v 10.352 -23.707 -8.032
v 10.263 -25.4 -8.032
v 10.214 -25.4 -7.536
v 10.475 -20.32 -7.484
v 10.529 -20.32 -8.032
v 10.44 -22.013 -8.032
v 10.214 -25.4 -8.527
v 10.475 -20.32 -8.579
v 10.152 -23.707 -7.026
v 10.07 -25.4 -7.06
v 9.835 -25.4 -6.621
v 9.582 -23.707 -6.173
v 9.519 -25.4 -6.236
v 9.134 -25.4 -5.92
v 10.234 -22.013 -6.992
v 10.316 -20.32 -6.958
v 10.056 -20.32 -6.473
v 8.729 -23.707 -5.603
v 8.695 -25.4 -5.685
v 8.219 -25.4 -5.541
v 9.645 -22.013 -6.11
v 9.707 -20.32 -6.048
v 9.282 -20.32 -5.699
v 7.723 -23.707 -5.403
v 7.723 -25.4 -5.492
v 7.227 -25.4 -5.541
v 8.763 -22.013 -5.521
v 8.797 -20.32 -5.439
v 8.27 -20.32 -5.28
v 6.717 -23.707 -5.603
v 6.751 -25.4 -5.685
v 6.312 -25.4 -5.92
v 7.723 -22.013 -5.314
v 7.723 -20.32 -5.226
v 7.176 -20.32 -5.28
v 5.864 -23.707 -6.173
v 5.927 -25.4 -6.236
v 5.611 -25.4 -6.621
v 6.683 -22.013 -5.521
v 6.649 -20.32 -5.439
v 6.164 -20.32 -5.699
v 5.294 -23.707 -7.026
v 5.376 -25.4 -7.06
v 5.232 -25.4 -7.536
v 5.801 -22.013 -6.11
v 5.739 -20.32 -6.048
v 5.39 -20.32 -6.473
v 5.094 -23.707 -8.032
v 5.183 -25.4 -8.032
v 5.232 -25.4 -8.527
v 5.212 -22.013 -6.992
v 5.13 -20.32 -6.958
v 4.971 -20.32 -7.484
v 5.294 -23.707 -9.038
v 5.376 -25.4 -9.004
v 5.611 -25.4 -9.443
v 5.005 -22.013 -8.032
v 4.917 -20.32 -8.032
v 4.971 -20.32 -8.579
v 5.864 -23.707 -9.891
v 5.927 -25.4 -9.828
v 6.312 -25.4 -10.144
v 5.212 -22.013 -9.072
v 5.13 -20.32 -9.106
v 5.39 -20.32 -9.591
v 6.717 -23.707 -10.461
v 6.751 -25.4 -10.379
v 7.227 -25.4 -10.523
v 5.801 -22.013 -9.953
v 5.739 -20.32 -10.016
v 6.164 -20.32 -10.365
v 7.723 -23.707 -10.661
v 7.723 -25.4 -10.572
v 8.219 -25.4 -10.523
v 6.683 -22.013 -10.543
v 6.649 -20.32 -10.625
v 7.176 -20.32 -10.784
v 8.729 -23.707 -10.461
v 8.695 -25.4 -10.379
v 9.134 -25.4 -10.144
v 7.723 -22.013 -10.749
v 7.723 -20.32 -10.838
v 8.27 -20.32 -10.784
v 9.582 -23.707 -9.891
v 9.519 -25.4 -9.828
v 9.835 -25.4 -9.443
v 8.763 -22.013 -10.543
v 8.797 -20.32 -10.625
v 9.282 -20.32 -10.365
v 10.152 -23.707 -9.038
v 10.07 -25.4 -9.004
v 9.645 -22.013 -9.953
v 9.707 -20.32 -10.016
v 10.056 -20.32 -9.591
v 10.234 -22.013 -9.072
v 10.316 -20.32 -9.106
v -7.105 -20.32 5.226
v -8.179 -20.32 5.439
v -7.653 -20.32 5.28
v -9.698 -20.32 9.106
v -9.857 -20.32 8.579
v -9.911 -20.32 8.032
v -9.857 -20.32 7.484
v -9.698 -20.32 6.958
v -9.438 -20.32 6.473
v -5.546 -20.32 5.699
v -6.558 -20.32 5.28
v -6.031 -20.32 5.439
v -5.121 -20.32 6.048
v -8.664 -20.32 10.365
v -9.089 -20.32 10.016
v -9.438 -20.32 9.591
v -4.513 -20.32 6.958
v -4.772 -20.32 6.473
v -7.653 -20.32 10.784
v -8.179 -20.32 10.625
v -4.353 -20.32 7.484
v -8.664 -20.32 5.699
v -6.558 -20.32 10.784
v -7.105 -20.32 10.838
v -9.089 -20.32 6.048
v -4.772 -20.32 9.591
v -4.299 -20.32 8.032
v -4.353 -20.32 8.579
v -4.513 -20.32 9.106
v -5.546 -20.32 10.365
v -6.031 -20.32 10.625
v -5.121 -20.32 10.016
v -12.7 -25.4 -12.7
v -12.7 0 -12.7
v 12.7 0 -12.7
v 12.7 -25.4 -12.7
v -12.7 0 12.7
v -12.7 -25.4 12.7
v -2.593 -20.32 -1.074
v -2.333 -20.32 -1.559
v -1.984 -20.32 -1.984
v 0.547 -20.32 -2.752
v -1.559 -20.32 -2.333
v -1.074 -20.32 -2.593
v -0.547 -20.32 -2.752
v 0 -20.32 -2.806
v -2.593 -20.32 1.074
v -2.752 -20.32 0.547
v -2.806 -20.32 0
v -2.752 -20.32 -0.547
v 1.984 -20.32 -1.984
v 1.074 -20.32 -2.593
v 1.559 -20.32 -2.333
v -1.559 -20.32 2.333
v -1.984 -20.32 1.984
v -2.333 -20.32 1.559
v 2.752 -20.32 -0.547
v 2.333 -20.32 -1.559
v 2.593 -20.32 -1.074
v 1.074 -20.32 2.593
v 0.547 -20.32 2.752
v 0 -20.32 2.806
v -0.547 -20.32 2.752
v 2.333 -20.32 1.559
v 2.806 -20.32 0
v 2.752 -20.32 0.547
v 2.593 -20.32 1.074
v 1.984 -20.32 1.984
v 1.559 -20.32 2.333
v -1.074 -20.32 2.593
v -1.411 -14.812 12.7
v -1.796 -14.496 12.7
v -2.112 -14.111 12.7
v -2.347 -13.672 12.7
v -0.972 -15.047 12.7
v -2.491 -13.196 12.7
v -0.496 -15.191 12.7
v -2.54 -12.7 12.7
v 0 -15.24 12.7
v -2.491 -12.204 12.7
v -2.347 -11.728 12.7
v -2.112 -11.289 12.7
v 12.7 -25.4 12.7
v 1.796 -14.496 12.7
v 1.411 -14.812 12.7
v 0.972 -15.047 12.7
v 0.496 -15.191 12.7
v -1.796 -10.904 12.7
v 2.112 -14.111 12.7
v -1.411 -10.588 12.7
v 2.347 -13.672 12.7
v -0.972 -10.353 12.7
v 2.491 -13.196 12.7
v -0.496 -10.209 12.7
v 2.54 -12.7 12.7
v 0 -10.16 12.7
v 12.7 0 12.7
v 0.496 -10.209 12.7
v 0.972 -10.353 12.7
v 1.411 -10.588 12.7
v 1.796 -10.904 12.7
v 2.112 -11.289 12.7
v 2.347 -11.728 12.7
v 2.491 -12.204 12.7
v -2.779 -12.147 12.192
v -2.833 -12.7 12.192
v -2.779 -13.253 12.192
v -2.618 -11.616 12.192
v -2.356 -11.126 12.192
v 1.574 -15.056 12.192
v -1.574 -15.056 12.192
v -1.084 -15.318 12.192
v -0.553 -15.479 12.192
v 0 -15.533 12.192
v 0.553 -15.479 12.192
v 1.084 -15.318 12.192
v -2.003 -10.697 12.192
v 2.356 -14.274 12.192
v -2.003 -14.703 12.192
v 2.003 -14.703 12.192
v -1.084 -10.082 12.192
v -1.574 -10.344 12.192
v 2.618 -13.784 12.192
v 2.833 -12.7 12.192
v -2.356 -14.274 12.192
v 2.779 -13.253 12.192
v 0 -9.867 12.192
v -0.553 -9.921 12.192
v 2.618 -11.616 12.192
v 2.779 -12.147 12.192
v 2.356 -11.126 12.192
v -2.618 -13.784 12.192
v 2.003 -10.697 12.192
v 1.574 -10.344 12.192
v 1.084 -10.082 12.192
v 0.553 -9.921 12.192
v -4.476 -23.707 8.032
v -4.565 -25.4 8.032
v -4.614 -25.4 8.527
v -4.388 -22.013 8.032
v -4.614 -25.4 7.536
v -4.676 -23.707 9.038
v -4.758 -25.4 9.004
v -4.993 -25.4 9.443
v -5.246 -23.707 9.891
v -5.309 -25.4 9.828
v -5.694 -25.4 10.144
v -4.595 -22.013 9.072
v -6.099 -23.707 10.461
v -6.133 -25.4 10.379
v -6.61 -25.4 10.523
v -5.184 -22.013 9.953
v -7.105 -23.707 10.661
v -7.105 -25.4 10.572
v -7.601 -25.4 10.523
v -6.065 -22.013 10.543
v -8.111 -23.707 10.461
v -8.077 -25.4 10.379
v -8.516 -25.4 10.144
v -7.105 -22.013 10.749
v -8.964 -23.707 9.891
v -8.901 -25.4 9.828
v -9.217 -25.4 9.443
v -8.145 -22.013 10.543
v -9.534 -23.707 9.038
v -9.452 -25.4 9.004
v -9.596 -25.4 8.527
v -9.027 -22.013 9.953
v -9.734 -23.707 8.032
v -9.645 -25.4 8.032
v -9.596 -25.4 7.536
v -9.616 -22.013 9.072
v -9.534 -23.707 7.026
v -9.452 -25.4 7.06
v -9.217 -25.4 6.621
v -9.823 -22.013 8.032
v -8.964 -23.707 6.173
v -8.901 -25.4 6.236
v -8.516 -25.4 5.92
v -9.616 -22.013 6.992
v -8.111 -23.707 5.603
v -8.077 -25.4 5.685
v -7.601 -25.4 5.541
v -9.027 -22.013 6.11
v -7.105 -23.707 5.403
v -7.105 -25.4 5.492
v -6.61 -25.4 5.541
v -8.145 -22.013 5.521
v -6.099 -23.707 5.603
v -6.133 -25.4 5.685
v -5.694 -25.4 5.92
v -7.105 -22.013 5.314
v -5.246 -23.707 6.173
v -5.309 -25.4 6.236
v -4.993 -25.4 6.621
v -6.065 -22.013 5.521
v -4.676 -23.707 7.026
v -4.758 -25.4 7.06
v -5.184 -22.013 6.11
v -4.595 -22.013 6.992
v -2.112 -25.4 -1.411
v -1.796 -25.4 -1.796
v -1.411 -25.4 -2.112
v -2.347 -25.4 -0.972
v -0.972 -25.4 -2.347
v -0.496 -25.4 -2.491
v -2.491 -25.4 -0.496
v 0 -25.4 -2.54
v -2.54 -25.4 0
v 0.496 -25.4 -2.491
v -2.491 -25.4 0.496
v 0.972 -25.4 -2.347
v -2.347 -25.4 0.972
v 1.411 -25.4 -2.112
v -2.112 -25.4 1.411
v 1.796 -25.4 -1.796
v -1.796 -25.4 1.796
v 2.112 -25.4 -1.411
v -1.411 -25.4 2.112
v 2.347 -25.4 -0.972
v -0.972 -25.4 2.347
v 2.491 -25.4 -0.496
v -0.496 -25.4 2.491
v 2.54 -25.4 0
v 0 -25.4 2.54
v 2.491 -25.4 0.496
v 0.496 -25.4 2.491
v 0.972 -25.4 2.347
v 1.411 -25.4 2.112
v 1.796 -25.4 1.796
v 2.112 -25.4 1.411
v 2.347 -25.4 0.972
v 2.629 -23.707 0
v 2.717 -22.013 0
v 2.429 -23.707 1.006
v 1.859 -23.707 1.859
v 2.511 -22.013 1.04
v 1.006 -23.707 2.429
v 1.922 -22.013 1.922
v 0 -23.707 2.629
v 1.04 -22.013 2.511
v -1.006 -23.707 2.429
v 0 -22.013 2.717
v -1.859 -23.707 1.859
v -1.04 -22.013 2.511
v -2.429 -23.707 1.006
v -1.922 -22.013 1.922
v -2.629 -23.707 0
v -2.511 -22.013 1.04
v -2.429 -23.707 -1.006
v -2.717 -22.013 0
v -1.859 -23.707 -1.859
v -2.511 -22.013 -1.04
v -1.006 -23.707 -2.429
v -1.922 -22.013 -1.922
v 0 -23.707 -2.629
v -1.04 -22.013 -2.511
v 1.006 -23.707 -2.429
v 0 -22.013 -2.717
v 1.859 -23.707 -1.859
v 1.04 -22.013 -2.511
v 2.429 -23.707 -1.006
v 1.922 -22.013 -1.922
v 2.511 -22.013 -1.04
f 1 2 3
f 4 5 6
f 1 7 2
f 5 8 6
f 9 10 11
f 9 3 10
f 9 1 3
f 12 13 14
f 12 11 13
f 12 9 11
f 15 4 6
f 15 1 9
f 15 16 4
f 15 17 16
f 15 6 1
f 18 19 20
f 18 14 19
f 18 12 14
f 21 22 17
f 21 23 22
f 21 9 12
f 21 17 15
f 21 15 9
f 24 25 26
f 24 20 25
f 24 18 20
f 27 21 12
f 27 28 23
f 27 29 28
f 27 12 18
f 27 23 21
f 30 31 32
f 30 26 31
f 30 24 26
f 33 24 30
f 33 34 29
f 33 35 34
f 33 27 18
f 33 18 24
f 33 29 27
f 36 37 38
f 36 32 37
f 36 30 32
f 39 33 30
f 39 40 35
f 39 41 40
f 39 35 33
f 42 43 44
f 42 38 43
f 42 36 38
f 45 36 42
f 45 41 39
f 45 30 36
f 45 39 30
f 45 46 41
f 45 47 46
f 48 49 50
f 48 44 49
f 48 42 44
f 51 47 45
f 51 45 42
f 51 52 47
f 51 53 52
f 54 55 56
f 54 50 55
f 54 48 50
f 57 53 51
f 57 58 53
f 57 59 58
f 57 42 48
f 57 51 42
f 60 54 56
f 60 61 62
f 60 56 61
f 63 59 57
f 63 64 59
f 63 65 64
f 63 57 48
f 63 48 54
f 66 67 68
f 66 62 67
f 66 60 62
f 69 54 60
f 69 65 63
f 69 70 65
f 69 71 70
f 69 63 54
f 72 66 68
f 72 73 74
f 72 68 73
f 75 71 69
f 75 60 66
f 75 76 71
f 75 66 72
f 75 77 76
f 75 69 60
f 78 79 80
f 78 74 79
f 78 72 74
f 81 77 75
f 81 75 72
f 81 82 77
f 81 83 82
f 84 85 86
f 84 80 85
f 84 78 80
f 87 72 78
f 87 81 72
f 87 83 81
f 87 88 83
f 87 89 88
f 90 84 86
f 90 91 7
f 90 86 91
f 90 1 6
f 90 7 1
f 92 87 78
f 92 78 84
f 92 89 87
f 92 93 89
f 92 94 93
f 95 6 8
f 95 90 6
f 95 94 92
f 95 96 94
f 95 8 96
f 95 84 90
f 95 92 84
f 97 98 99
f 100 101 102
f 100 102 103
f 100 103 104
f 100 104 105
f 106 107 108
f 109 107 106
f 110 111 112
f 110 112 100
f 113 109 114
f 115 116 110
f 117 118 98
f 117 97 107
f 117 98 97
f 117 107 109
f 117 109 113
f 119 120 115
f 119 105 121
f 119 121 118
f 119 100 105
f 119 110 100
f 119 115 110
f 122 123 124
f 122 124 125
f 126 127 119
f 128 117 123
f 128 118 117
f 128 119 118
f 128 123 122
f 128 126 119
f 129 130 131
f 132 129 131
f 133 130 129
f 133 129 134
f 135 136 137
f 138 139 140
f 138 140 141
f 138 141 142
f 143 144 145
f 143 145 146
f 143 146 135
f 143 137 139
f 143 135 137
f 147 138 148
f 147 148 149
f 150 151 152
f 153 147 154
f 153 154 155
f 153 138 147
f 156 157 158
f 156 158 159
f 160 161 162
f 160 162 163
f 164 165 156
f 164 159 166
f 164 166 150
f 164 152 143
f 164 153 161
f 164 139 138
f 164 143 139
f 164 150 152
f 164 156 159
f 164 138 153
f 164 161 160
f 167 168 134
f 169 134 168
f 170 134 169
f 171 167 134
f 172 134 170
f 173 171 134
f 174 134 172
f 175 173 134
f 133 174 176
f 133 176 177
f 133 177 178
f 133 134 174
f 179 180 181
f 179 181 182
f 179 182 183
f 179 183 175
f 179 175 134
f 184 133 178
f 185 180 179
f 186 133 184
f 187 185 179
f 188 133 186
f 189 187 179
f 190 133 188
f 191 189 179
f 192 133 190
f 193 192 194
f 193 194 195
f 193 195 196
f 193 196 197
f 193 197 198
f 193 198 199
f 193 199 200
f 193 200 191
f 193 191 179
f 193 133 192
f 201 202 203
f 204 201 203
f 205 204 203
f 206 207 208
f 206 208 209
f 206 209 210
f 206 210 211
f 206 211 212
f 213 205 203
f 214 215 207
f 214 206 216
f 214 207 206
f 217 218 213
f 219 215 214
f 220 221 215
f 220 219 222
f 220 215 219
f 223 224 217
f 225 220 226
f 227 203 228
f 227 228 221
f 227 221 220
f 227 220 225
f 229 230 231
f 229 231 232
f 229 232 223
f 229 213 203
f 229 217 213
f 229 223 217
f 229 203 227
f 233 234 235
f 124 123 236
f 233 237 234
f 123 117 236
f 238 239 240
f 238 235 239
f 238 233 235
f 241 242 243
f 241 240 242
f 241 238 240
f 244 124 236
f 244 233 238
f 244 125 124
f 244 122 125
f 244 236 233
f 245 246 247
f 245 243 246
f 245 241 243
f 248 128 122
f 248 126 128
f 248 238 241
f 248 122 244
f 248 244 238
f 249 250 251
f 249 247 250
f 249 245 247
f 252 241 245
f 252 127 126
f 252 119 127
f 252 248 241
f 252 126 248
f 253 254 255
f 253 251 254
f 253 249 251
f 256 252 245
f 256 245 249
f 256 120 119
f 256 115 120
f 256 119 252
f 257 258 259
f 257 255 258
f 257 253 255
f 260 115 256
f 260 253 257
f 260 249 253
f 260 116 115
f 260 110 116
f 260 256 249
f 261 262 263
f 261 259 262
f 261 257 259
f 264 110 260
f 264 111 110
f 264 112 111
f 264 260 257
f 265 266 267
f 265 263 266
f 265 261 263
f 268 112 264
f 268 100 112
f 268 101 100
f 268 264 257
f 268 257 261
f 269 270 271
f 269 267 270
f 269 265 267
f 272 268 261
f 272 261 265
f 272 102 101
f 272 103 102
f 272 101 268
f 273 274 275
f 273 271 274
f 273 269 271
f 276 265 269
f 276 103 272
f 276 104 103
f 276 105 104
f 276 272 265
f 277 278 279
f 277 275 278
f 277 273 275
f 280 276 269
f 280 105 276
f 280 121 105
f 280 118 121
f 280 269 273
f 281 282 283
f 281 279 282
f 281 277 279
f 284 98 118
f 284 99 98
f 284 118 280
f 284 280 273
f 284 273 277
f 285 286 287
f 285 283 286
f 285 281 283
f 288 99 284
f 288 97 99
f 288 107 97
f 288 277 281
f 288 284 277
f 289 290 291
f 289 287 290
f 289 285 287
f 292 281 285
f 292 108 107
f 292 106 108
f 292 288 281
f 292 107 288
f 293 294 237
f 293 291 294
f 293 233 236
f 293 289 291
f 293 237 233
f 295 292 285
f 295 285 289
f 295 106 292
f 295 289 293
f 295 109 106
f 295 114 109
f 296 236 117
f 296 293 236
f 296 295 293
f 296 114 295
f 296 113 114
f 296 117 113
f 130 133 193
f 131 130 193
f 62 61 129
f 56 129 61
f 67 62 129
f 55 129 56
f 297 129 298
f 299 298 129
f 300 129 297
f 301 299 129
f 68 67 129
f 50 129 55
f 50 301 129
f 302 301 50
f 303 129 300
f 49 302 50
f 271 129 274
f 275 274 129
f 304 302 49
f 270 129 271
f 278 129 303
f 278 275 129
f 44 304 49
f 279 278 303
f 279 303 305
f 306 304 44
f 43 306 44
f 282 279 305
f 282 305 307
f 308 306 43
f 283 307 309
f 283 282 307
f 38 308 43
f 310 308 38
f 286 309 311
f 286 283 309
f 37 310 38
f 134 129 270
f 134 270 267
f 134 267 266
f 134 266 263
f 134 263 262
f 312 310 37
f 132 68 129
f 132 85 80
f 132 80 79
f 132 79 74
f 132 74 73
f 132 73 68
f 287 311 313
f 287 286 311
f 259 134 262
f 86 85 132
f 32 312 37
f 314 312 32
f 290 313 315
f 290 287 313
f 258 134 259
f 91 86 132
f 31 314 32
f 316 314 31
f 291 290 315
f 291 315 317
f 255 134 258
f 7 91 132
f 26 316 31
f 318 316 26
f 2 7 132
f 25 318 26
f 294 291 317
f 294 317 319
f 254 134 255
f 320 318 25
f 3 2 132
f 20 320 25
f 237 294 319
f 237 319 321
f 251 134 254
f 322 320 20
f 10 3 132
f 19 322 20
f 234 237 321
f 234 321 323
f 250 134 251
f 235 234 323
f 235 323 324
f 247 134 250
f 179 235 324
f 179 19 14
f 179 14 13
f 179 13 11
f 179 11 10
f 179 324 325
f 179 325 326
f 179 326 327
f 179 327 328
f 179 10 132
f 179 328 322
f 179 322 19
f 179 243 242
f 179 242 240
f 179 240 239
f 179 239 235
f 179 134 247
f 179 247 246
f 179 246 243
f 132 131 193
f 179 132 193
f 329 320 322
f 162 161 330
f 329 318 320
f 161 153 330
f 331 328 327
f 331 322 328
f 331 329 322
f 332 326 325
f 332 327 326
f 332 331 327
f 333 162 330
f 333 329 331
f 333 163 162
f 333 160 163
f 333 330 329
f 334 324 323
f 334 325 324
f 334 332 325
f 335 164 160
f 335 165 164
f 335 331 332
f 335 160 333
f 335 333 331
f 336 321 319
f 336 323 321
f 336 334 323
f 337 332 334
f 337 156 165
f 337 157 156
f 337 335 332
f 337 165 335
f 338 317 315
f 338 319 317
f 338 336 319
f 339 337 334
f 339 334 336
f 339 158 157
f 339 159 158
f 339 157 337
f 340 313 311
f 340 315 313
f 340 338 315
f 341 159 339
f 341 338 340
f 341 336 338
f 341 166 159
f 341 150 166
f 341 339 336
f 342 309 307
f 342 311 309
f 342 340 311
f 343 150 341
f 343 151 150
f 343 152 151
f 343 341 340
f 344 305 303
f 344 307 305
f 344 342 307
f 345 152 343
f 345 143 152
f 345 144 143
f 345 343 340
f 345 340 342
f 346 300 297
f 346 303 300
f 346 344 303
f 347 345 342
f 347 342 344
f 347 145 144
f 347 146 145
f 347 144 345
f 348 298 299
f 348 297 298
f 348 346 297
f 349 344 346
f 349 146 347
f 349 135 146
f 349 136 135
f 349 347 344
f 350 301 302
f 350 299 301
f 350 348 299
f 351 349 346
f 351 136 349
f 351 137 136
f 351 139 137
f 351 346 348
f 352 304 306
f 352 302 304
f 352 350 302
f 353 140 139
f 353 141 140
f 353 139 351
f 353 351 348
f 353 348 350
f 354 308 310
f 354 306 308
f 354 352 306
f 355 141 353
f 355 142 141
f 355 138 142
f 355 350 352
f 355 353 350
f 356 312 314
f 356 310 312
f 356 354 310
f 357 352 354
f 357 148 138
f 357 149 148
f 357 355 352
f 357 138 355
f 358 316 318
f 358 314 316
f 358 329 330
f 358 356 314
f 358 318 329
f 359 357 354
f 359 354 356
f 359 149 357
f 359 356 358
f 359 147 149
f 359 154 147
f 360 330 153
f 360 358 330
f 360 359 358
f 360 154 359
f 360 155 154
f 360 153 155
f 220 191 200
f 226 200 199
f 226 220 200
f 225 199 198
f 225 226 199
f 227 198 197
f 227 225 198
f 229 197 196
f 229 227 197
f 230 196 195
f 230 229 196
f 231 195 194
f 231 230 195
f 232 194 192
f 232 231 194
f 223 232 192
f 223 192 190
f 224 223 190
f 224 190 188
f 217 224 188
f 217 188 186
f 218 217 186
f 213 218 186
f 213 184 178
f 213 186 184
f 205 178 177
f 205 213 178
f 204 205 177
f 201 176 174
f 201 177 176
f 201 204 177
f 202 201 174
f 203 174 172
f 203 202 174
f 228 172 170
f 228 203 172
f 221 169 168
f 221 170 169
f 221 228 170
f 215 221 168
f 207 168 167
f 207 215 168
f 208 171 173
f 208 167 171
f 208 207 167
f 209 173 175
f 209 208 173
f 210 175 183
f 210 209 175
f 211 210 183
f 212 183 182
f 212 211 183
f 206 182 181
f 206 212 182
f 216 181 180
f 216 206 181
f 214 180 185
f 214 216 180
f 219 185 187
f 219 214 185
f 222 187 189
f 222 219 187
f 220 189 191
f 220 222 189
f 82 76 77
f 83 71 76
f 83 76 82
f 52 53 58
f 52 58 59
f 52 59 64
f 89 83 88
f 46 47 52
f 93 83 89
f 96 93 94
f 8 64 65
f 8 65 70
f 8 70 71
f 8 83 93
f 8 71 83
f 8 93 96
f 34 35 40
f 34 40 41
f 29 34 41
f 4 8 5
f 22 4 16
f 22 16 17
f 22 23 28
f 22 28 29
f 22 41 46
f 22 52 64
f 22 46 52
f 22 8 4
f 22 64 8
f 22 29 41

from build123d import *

# Parameters (mm, degrees)
F0_W     = 25.4
F0_H     = 25.4
F1_DEPTH = 25.4
F2_R     = 2.54
F3_DEPTH = 0.508
F3_TAPER = -30
F4_R     = 2.54
F5_DEPTH = 5.08
F5_TAPER = -3


# Not quite as in the source:
# - the program builds the solid bodies; features that only make, move or delete a surface that nothing else refers to are left out


with BuildPart() as f1:
    # F0 (on Front) → F1 (new body)
    with BuildSketch(Plane.XZ):
        Rectangle(F0_W, F0_H)
    extrude(amount=F1_DEPTH)

    # F2 (on face) → F3 (cut)
    with BuildSketch(Plane.XY.offset(12.7)):
        with Locations((0, -12.7)):
            Circle(F2_R)
    extrude(amount=-F3_DEPTH, taper=F3_TAPER, mode=Mode.SUBTRACT)

    # F4 (on face) → F5 (cut)
    with BuildSketch(Plane.XZ.offset(25.4)):
        Circle(F4_R)
        with Locations((-7.1051362902, 8.0318916589)):
            Circle(F4_R)
        with Locations((7.7229747549, -8.0318916589)):
            Circle(F4_R)
    extrude(amount=-F5_DEPTH, taper=F5_TAPER, mode=Mode.SUBTRACT)


solid = f1.part
